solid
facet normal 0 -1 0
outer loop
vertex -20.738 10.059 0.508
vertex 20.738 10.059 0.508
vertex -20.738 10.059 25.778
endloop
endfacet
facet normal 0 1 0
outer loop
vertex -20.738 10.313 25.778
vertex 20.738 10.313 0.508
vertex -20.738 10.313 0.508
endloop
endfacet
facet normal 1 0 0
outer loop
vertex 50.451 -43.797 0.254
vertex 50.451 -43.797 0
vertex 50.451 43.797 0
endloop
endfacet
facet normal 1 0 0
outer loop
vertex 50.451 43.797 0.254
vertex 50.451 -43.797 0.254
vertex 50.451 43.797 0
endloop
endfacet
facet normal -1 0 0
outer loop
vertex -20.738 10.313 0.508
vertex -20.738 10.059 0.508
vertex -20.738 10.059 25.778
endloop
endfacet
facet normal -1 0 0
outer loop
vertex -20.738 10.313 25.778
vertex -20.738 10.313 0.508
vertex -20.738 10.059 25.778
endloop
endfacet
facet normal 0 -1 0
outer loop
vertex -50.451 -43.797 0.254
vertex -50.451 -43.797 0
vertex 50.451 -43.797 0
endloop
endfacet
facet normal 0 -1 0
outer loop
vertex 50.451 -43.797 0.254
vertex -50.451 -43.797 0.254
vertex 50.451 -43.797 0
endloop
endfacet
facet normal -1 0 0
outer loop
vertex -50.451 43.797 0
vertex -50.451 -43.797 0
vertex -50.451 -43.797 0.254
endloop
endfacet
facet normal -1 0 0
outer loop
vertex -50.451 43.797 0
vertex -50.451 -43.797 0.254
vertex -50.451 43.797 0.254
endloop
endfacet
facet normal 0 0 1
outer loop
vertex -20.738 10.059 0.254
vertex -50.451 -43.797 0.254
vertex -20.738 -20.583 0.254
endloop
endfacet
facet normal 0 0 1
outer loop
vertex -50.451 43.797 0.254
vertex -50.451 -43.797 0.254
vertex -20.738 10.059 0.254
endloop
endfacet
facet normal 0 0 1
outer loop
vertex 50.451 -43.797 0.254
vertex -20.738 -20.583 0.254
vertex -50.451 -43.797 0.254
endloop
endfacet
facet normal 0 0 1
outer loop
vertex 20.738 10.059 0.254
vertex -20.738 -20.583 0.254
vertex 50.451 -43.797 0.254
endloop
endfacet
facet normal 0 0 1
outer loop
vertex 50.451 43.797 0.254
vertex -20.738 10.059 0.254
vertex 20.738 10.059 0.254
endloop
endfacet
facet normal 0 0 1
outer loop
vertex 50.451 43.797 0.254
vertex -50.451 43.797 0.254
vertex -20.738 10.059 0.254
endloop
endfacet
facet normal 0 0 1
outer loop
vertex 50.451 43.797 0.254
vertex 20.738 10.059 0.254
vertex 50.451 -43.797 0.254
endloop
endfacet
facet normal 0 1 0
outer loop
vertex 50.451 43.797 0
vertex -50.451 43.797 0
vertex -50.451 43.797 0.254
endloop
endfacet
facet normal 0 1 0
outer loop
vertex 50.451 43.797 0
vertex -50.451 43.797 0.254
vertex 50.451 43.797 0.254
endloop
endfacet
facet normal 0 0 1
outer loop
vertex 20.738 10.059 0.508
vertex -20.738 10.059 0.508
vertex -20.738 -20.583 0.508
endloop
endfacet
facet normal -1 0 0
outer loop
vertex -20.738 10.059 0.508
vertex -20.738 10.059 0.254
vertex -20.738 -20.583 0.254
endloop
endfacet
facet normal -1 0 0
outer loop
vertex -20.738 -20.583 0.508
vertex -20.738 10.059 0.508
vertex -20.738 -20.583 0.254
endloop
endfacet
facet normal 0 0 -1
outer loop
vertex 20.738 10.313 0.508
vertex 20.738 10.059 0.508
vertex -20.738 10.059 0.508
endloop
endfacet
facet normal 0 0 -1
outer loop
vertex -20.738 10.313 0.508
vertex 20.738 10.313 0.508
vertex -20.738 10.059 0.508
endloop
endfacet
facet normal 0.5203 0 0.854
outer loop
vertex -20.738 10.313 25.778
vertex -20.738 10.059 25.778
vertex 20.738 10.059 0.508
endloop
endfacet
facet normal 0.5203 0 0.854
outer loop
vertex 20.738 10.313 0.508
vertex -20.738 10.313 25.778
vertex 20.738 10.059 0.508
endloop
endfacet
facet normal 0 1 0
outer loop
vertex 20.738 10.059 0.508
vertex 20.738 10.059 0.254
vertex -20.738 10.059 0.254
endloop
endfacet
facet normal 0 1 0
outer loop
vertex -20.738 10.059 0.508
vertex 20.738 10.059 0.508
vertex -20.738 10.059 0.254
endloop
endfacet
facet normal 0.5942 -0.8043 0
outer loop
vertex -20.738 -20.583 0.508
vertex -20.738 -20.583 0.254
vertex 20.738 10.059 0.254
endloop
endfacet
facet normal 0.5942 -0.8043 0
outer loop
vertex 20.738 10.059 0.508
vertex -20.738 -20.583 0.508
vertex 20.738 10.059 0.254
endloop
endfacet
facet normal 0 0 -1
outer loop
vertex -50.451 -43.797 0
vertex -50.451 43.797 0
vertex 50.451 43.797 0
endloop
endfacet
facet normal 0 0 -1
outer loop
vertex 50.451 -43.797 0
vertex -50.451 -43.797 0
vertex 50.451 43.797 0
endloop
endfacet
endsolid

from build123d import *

# Parameters (mm, degrees)
F0_W     = 100.902356
F0_H     = 87.593154
F1_DEPTH = 0.254
F3_DEPTH = 0.254
F5_DEPTH = 0.254


with BuildPart() as f1:
    # F0 (on Top) → F1 (new body)
    with BuildSketch(Plane.XY):
        Rectangle(F0_W, F0_H)
    extrude(amount=F1_DEPTH)

    # F2 (on face) → F3 (join)
    with BuildSketch(Plane.XY.offset(0.254)):
        Polygon((20.737601, 10.059285), (-20.737601, 10.059285), (-20.737601, -20.582844), align=None)
    extrude(amount=F3_DEPTH)


with BuildPart() as f5:
    # F4 (on face) → F5 (new body)
    with BuildSketch(Plane(origin=(0, 10.059285, 0), x_dir=(-1, 0, 0), z_dir=(0, 1, 0))):
        Polygon((-20.737601, 0.508), (20.737601, 0.508), (20.737601, 25.777958), align=None)
    extrude(amount=F5_DEPTH)


solid = Compound([f1.part, f5.part])
